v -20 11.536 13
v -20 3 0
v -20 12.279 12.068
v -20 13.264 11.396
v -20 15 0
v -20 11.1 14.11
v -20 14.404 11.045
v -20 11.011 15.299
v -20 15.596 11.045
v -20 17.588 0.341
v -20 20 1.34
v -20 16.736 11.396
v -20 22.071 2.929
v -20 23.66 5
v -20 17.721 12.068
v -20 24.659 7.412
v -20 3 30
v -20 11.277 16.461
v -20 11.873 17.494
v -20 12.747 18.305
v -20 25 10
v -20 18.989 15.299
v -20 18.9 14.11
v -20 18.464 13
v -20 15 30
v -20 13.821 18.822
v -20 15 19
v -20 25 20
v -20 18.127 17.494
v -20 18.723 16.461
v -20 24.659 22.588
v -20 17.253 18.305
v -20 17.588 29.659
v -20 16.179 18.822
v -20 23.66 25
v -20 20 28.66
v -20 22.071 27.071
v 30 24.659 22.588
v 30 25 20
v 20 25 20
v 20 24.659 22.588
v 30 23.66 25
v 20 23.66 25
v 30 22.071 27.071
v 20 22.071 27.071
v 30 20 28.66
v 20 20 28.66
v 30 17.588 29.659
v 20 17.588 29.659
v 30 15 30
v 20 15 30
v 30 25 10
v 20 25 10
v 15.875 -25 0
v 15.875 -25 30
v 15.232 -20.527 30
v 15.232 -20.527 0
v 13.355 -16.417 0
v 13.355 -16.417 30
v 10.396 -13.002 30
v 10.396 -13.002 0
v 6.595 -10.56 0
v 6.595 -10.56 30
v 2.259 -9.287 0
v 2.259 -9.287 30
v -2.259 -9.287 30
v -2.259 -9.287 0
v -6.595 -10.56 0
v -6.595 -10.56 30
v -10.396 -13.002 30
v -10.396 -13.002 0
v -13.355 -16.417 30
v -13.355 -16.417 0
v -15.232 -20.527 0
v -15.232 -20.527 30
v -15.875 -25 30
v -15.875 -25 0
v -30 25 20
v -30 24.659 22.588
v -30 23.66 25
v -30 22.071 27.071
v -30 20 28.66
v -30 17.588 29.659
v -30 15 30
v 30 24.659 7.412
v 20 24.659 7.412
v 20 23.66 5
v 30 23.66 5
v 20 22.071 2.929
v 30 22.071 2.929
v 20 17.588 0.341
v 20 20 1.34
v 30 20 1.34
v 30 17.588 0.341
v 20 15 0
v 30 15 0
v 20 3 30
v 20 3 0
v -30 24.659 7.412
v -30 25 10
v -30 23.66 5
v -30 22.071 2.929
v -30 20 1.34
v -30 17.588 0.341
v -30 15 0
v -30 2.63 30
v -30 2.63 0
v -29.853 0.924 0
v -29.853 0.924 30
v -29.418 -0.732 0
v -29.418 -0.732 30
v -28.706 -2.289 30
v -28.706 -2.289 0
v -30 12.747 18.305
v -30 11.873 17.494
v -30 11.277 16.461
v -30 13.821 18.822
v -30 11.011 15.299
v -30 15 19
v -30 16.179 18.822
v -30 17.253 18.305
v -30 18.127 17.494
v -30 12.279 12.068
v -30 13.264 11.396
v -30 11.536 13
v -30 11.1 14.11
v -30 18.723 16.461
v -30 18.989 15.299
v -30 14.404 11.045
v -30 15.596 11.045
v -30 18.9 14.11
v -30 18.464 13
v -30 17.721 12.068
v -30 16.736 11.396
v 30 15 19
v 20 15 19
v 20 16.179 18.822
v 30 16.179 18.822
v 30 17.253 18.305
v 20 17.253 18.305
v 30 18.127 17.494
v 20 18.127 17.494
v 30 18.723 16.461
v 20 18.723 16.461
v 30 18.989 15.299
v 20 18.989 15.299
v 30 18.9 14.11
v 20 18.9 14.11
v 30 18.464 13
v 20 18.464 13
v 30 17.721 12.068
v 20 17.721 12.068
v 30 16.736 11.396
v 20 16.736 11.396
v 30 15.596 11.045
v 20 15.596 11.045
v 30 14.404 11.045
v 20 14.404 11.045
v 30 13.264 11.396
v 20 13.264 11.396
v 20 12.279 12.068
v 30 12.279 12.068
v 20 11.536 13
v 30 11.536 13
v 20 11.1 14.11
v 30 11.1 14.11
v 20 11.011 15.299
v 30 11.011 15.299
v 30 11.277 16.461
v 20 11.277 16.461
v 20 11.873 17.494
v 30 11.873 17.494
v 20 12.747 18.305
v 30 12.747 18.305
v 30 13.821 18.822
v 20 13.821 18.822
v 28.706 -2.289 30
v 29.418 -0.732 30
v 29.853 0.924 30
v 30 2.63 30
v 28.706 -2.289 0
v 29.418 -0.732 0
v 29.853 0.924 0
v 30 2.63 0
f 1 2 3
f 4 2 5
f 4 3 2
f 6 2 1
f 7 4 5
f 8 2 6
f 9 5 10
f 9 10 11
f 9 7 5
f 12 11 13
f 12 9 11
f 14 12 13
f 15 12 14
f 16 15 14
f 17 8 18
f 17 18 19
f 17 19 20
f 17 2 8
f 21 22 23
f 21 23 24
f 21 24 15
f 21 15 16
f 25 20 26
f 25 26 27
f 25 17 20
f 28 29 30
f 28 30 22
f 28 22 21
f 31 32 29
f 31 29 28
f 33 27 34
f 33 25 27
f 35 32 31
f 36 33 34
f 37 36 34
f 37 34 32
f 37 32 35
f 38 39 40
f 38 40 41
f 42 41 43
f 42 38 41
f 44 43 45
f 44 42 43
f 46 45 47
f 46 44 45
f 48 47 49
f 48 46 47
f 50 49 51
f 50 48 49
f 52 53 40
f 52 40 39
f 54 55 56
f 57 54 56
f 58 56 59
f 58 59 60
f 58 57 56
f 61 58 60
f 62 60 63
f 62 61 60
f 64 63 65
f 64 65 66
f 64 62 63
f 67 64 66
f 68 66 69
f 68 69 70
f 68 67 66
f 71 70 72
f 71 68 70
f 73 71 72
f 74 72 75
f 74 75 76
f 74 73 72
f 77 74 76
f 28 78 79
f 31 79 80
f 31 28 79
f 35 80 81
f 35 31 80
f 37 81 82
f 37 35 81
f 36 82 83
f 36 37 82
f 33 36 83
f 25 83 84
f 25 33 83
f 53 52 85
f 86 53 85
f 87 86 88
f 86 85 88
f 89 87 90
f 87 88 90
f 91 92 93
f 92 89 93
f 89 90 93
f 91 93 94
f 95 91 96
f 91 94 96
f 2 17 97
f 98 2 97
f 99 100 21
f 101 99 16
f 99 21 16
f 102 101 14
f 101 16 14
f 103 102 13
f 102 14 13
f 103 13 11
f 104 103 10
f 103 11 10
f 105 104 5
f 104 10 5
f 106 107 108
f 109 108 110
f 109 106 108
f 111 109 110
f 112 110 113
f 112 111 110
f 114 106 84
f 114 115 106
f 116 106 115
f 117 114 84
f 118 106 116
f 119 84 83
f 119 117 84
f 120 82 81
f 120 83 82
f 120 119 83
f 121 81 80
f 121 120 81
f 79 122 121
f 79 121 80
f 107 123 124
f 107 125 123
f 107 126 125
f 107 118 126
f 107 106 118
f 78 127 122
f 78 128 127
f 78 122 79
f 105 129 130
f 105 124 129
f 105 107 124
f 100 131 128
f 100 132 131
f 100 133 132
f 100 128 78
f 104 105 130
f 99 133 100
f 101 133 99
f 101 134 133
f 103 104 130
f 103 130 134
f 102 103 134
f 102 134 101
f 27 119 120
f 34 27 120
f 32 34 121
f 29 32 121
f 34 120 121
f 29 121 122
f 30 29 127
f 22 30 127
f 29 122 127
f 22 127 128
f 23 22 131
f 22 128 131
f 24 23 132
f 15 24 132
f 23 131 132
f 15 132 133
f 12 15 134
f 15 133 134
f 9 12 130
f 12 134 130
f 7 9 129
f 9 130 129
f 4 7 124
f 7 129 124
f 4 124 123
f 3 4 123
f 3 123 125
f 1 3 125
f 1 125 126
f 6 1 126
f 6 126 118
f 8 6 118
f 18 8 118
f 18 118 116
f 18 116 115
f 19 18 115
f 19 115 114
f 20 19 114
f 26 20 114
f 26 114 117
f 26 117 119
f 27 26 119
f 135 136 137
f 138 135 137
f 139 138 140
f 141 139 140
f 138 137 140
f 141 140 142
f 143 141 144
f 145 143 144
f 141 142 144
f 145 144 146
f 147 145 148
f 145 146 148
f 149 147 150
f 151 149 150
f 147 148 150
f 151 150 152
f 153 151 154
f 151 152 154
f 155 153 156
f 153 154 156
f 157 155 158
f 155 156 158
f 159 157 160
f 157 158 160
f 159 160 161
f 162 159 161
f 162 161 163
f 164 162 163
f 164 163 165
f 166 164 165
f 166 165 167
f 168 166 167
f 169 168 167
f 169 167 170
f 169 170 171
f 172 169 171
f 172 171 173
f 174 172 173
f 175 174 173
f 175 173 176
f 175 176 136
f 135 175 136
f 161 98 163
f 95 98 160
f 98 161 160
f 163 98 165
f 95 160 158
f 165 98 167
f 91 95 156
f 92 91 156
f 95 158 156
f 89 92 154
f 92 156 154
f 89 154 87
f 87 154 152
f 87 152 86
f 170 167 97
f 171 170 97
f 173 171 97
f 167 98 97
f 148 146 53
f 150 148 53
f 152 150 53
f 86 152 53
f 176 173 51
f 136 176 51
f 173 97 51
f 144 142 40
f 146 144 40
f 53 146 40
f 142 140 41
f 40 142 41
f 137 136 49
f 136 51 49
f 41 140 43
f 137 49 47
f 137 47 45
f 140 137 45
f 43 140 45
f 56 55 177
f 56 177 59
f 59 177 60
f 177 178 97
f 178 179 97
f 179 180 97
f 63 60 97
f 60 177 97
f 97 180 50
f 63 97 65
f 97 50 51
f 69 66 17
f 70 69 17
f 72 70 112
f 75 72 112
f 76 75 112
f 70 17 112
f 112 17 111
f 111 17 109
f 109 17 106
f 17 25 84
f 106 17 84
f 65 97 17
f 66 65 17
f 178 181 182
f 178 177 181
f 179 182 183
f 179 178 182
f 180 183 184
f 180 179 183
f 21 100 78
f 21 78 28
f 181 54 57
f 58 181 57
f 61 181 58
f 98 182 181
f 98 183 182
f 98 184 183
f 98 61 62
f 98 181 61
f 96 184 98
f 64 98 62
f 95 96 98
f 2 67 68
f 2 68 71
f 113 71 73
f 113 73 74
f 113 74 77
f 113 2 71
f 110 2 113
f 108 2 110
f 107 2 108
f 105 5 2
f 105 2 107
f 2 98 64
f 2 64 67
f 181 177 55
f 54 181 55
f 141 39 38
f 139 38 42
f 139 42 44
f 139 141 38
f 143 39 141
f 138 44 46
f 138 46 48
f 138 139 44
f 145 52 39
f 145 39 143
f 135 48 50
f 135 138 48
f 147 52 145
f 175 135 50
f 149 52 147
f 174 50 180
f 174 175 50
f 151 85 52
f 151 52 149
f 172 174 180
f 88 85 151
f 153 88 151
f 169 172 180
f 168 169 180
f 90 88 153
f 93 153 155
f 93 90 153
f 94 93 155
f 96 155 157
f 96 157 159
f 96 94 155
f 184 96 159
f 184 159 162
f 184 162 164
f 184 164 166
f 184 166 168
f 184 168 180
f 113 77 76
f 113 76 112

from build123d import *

# Parameters (mm, degrees)
BOSS_EXTRUDE1_DEPTH = 30
FILLET1_R           = 10
SKETCH2_R           = 4
CUT_EXTRUDE1_DEPTH  = 72.589105316
SKETCH4_W           = 40
SKETCH4_H           = 22
CUT_EXTRUDE2_DEPTH  = 50.244289009
FILLET2_R           = 10


with BuildPart() as part:
    # Sketch1 → Boss-Extrude1 (new body)
    with BuildSketch(Plane.XY):
        with BuildLine():
            Line((-15.875, 25), (-15.875, 7))
            Line((-15.875, 7), (15.875, 7))
            Line((15.875, 7), (15.875, 25))
            Line((15.875, 25), (30, 25))
            Line((30, 25), (30, 0))
            Line((30, 0), (15.875, -25))
            ThreePointArc((15.875, -25), (0, -9.125), (-15.875, -25))
            Line((-15.875, -25), (-30, 0))
            Line((-30, 0), (-30, 25))
            Line((-30, 25), (-15.875, 25))
        make_face()
    extrude(amount=BOSS_EXTRUDE1_DEPTH)

    # Fillet1
    fillet1_edges = [part.edges().sort_by_distance(p)[0] for p in [
        (-22.9375, 25, 0),
        (22.9375, 25, 0),
        (22.9375, 25, 30),
        (-22.9375, 25, 30),
    ]]
    fillet(fillet1_edges, radius=FILLET1_R)

    # Sketch2 → Cut-Extrude1 (cut, through all)
    with BuildSketch(Plane.ZY.offset(30)):
        with Locations((15, 15)):
            Circle(SKETCH2_R)
    extrude(amount=-CUT_EXTRUDE1_DEPTH, mode=Mode.SUBTRACT)

    # Sketch4 → Cut-Extrude2 (cut, through all)
    with BuildSketch(Plane.XY.offset(30)):
        with Locations((0, 14)):
            Rectangle(SKETCH4_W, SKETCH4_H)
    extrude(amount=-CUT_EXTRUDE2_DEPTH, mode=Mode.SUBTRACT)

    # Fillet2
    fillet2_edges = [part.edges().sort_by_distance(p)[0] for p in [
        (-30, 0, 15),
        (30, 0, 15),
    ]]
    fillet(fillet2_edges, radius=FILLET2_R)


solid = part.part
